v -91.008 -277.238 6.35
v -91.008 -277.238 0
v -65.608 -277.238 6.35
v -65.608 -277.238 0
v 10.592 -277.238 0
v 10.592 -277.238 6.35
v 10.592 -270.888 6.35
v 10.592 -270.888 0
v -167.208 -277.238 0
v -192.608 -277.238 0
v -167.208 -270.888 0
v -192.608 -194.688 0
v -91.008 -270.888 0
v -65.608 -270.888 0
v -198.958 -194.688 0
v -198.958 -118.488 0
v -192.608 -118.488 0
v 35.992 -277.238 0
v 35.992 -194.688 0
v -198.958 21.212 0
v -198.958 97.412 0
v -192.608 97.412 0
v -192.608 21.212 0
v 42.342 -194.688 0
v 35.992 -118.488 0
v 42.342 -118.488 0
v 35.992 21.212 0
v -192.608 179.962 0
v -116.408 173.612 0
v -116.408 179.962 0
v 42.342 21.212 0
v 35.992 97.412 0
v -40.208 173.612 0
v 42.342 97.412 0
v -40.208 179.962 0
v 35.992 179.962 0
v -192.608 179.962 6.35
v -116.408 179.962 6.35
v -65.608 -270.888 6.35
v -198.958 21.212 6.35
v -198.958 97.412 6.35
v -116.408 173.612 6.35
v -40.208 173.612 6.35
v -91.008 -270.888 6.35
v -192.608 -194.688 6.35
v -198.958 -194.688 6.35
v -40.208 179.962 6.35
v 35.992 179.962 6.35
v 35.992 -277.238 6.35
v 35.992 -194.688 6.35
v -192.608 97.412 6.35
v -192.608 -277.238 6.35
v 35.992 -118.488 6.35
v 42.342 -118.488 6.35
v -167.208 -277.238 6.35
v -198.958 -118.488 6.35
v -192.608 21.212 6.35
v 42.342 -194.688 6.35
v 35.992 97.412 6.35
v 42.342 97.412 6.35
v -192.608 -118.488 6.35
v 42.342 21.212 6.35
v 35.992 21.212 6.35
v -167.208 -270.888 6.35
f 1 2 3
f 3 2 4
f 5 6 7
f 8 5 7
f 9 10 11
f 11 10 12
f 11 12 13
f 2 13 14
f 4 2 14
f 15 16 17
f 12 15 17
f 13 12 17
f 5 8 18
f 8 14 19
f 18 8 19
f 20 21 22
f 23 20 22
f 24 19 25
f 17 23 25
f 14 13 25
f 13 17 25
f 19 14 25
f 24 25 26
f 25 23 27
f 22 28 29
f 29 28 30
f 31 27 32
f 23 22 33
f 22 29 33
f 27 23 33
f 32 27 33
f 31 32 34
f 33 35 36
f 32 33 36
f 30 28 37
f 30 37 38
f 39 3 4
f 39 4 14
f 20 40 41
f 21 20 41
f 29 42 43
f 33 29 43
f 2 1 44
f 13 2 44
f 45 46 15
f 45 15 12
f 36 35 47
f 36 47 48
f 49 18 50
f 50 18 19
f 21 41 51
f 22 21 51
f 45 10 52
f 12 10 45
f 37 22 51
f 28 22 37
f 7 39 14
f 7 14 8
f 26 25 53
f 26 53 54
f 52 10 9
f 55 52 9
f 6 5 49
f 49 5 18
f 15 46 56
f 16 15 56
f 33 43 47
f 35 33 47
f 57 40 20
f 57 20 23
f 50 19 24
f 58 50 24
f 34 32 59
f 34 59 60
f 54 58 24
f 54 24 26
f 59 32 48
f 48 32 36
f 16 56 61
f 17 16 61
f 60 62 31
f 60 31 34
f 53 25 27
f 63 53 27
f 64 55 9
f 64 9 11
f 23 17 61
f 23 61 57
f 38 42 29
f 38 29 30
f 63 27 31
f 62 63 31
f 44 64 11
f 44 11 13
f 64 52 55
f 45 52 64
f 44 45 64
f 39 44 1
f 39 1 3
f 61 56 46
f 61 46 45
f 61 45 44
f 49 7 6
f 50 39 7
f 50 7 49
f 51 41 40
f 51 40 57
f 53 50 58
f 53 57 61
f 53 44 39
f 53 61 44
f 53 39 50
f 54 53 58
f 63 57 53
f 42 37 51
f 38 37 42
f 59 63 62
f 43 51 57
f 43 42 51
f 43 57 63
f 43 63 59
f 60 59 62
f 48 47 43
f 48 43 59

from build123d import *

# Parameters (mm, degrees)
SKETCH1_W           = 228.6
SKETCH1_H           = 457.2
BOSS_EXTRUDE1_DEPTH = 6.35
SKETCH2_W           = 6.35
SKETCH2_H           = 76.2
BOSS_EXTRUDE4_DEPTH = 6.35
SKETCH3_W           = 76.2
SKETCH3_H           = 6.35
CUT_EXTRUDE1_DEPTH  = 6.35


with BuildPart() as part:
    # Sketch1 → Boss-Extrude1 (new body)
    with BuildSketch(Plane.XY):
        with Locations((-78.307659574, -48.638297872)):
            Rectangle(SKETCH1_W, SKETCH1_H)
    extrude(amount=BOSS_EXTRUDE1_DEPTH)

    # Sketch2 → Boss-Extrude4 (add, through all)
    with BuildSketch(Plane.XY.offset(6.35)):
        with Locations((-195.782659574, 59.311702128)):
            Rectangle(SKETCH2_W, SKETCH2_H)
        with Locations((-195.782659574, -156.588297872)):
            Rectangle(SKETCH2_W, SKETCH2_H)
        with Locations((39.167340426, -156.588297872)):
            Rectangle(SKETCH2_W, SKETCH2_H)
        with Locations((39.167340426, 59.311702128)):
            Rectangle(SKETCH2_W, SKETCH2_H)
    extrude(amount=-BOSS_EXTRUDE4_DEPTH)

    # Sketch3 → Cut-Extrude1 (cut)
    with BuildSketch(Plane.XY.offset(6.35)):
        with Locations((-129.107659574, -274.063297872)):
            Rectangle(SKETCH3_W, SKETCH3_H)
        with Locations((-27.507659574, -274.063297872)):
            Rectangle(SKETCH3_W, SKETCH3_H)
        with Locations((-78.307659574, 176.786702128)):
            Rectangle(SKETCH3_W, SKETCH3_H)
    extrude(amount=-CUT_EXTRUDE1_DEPTH, mode=Mode.SUBTRACT)


solid = part.part
